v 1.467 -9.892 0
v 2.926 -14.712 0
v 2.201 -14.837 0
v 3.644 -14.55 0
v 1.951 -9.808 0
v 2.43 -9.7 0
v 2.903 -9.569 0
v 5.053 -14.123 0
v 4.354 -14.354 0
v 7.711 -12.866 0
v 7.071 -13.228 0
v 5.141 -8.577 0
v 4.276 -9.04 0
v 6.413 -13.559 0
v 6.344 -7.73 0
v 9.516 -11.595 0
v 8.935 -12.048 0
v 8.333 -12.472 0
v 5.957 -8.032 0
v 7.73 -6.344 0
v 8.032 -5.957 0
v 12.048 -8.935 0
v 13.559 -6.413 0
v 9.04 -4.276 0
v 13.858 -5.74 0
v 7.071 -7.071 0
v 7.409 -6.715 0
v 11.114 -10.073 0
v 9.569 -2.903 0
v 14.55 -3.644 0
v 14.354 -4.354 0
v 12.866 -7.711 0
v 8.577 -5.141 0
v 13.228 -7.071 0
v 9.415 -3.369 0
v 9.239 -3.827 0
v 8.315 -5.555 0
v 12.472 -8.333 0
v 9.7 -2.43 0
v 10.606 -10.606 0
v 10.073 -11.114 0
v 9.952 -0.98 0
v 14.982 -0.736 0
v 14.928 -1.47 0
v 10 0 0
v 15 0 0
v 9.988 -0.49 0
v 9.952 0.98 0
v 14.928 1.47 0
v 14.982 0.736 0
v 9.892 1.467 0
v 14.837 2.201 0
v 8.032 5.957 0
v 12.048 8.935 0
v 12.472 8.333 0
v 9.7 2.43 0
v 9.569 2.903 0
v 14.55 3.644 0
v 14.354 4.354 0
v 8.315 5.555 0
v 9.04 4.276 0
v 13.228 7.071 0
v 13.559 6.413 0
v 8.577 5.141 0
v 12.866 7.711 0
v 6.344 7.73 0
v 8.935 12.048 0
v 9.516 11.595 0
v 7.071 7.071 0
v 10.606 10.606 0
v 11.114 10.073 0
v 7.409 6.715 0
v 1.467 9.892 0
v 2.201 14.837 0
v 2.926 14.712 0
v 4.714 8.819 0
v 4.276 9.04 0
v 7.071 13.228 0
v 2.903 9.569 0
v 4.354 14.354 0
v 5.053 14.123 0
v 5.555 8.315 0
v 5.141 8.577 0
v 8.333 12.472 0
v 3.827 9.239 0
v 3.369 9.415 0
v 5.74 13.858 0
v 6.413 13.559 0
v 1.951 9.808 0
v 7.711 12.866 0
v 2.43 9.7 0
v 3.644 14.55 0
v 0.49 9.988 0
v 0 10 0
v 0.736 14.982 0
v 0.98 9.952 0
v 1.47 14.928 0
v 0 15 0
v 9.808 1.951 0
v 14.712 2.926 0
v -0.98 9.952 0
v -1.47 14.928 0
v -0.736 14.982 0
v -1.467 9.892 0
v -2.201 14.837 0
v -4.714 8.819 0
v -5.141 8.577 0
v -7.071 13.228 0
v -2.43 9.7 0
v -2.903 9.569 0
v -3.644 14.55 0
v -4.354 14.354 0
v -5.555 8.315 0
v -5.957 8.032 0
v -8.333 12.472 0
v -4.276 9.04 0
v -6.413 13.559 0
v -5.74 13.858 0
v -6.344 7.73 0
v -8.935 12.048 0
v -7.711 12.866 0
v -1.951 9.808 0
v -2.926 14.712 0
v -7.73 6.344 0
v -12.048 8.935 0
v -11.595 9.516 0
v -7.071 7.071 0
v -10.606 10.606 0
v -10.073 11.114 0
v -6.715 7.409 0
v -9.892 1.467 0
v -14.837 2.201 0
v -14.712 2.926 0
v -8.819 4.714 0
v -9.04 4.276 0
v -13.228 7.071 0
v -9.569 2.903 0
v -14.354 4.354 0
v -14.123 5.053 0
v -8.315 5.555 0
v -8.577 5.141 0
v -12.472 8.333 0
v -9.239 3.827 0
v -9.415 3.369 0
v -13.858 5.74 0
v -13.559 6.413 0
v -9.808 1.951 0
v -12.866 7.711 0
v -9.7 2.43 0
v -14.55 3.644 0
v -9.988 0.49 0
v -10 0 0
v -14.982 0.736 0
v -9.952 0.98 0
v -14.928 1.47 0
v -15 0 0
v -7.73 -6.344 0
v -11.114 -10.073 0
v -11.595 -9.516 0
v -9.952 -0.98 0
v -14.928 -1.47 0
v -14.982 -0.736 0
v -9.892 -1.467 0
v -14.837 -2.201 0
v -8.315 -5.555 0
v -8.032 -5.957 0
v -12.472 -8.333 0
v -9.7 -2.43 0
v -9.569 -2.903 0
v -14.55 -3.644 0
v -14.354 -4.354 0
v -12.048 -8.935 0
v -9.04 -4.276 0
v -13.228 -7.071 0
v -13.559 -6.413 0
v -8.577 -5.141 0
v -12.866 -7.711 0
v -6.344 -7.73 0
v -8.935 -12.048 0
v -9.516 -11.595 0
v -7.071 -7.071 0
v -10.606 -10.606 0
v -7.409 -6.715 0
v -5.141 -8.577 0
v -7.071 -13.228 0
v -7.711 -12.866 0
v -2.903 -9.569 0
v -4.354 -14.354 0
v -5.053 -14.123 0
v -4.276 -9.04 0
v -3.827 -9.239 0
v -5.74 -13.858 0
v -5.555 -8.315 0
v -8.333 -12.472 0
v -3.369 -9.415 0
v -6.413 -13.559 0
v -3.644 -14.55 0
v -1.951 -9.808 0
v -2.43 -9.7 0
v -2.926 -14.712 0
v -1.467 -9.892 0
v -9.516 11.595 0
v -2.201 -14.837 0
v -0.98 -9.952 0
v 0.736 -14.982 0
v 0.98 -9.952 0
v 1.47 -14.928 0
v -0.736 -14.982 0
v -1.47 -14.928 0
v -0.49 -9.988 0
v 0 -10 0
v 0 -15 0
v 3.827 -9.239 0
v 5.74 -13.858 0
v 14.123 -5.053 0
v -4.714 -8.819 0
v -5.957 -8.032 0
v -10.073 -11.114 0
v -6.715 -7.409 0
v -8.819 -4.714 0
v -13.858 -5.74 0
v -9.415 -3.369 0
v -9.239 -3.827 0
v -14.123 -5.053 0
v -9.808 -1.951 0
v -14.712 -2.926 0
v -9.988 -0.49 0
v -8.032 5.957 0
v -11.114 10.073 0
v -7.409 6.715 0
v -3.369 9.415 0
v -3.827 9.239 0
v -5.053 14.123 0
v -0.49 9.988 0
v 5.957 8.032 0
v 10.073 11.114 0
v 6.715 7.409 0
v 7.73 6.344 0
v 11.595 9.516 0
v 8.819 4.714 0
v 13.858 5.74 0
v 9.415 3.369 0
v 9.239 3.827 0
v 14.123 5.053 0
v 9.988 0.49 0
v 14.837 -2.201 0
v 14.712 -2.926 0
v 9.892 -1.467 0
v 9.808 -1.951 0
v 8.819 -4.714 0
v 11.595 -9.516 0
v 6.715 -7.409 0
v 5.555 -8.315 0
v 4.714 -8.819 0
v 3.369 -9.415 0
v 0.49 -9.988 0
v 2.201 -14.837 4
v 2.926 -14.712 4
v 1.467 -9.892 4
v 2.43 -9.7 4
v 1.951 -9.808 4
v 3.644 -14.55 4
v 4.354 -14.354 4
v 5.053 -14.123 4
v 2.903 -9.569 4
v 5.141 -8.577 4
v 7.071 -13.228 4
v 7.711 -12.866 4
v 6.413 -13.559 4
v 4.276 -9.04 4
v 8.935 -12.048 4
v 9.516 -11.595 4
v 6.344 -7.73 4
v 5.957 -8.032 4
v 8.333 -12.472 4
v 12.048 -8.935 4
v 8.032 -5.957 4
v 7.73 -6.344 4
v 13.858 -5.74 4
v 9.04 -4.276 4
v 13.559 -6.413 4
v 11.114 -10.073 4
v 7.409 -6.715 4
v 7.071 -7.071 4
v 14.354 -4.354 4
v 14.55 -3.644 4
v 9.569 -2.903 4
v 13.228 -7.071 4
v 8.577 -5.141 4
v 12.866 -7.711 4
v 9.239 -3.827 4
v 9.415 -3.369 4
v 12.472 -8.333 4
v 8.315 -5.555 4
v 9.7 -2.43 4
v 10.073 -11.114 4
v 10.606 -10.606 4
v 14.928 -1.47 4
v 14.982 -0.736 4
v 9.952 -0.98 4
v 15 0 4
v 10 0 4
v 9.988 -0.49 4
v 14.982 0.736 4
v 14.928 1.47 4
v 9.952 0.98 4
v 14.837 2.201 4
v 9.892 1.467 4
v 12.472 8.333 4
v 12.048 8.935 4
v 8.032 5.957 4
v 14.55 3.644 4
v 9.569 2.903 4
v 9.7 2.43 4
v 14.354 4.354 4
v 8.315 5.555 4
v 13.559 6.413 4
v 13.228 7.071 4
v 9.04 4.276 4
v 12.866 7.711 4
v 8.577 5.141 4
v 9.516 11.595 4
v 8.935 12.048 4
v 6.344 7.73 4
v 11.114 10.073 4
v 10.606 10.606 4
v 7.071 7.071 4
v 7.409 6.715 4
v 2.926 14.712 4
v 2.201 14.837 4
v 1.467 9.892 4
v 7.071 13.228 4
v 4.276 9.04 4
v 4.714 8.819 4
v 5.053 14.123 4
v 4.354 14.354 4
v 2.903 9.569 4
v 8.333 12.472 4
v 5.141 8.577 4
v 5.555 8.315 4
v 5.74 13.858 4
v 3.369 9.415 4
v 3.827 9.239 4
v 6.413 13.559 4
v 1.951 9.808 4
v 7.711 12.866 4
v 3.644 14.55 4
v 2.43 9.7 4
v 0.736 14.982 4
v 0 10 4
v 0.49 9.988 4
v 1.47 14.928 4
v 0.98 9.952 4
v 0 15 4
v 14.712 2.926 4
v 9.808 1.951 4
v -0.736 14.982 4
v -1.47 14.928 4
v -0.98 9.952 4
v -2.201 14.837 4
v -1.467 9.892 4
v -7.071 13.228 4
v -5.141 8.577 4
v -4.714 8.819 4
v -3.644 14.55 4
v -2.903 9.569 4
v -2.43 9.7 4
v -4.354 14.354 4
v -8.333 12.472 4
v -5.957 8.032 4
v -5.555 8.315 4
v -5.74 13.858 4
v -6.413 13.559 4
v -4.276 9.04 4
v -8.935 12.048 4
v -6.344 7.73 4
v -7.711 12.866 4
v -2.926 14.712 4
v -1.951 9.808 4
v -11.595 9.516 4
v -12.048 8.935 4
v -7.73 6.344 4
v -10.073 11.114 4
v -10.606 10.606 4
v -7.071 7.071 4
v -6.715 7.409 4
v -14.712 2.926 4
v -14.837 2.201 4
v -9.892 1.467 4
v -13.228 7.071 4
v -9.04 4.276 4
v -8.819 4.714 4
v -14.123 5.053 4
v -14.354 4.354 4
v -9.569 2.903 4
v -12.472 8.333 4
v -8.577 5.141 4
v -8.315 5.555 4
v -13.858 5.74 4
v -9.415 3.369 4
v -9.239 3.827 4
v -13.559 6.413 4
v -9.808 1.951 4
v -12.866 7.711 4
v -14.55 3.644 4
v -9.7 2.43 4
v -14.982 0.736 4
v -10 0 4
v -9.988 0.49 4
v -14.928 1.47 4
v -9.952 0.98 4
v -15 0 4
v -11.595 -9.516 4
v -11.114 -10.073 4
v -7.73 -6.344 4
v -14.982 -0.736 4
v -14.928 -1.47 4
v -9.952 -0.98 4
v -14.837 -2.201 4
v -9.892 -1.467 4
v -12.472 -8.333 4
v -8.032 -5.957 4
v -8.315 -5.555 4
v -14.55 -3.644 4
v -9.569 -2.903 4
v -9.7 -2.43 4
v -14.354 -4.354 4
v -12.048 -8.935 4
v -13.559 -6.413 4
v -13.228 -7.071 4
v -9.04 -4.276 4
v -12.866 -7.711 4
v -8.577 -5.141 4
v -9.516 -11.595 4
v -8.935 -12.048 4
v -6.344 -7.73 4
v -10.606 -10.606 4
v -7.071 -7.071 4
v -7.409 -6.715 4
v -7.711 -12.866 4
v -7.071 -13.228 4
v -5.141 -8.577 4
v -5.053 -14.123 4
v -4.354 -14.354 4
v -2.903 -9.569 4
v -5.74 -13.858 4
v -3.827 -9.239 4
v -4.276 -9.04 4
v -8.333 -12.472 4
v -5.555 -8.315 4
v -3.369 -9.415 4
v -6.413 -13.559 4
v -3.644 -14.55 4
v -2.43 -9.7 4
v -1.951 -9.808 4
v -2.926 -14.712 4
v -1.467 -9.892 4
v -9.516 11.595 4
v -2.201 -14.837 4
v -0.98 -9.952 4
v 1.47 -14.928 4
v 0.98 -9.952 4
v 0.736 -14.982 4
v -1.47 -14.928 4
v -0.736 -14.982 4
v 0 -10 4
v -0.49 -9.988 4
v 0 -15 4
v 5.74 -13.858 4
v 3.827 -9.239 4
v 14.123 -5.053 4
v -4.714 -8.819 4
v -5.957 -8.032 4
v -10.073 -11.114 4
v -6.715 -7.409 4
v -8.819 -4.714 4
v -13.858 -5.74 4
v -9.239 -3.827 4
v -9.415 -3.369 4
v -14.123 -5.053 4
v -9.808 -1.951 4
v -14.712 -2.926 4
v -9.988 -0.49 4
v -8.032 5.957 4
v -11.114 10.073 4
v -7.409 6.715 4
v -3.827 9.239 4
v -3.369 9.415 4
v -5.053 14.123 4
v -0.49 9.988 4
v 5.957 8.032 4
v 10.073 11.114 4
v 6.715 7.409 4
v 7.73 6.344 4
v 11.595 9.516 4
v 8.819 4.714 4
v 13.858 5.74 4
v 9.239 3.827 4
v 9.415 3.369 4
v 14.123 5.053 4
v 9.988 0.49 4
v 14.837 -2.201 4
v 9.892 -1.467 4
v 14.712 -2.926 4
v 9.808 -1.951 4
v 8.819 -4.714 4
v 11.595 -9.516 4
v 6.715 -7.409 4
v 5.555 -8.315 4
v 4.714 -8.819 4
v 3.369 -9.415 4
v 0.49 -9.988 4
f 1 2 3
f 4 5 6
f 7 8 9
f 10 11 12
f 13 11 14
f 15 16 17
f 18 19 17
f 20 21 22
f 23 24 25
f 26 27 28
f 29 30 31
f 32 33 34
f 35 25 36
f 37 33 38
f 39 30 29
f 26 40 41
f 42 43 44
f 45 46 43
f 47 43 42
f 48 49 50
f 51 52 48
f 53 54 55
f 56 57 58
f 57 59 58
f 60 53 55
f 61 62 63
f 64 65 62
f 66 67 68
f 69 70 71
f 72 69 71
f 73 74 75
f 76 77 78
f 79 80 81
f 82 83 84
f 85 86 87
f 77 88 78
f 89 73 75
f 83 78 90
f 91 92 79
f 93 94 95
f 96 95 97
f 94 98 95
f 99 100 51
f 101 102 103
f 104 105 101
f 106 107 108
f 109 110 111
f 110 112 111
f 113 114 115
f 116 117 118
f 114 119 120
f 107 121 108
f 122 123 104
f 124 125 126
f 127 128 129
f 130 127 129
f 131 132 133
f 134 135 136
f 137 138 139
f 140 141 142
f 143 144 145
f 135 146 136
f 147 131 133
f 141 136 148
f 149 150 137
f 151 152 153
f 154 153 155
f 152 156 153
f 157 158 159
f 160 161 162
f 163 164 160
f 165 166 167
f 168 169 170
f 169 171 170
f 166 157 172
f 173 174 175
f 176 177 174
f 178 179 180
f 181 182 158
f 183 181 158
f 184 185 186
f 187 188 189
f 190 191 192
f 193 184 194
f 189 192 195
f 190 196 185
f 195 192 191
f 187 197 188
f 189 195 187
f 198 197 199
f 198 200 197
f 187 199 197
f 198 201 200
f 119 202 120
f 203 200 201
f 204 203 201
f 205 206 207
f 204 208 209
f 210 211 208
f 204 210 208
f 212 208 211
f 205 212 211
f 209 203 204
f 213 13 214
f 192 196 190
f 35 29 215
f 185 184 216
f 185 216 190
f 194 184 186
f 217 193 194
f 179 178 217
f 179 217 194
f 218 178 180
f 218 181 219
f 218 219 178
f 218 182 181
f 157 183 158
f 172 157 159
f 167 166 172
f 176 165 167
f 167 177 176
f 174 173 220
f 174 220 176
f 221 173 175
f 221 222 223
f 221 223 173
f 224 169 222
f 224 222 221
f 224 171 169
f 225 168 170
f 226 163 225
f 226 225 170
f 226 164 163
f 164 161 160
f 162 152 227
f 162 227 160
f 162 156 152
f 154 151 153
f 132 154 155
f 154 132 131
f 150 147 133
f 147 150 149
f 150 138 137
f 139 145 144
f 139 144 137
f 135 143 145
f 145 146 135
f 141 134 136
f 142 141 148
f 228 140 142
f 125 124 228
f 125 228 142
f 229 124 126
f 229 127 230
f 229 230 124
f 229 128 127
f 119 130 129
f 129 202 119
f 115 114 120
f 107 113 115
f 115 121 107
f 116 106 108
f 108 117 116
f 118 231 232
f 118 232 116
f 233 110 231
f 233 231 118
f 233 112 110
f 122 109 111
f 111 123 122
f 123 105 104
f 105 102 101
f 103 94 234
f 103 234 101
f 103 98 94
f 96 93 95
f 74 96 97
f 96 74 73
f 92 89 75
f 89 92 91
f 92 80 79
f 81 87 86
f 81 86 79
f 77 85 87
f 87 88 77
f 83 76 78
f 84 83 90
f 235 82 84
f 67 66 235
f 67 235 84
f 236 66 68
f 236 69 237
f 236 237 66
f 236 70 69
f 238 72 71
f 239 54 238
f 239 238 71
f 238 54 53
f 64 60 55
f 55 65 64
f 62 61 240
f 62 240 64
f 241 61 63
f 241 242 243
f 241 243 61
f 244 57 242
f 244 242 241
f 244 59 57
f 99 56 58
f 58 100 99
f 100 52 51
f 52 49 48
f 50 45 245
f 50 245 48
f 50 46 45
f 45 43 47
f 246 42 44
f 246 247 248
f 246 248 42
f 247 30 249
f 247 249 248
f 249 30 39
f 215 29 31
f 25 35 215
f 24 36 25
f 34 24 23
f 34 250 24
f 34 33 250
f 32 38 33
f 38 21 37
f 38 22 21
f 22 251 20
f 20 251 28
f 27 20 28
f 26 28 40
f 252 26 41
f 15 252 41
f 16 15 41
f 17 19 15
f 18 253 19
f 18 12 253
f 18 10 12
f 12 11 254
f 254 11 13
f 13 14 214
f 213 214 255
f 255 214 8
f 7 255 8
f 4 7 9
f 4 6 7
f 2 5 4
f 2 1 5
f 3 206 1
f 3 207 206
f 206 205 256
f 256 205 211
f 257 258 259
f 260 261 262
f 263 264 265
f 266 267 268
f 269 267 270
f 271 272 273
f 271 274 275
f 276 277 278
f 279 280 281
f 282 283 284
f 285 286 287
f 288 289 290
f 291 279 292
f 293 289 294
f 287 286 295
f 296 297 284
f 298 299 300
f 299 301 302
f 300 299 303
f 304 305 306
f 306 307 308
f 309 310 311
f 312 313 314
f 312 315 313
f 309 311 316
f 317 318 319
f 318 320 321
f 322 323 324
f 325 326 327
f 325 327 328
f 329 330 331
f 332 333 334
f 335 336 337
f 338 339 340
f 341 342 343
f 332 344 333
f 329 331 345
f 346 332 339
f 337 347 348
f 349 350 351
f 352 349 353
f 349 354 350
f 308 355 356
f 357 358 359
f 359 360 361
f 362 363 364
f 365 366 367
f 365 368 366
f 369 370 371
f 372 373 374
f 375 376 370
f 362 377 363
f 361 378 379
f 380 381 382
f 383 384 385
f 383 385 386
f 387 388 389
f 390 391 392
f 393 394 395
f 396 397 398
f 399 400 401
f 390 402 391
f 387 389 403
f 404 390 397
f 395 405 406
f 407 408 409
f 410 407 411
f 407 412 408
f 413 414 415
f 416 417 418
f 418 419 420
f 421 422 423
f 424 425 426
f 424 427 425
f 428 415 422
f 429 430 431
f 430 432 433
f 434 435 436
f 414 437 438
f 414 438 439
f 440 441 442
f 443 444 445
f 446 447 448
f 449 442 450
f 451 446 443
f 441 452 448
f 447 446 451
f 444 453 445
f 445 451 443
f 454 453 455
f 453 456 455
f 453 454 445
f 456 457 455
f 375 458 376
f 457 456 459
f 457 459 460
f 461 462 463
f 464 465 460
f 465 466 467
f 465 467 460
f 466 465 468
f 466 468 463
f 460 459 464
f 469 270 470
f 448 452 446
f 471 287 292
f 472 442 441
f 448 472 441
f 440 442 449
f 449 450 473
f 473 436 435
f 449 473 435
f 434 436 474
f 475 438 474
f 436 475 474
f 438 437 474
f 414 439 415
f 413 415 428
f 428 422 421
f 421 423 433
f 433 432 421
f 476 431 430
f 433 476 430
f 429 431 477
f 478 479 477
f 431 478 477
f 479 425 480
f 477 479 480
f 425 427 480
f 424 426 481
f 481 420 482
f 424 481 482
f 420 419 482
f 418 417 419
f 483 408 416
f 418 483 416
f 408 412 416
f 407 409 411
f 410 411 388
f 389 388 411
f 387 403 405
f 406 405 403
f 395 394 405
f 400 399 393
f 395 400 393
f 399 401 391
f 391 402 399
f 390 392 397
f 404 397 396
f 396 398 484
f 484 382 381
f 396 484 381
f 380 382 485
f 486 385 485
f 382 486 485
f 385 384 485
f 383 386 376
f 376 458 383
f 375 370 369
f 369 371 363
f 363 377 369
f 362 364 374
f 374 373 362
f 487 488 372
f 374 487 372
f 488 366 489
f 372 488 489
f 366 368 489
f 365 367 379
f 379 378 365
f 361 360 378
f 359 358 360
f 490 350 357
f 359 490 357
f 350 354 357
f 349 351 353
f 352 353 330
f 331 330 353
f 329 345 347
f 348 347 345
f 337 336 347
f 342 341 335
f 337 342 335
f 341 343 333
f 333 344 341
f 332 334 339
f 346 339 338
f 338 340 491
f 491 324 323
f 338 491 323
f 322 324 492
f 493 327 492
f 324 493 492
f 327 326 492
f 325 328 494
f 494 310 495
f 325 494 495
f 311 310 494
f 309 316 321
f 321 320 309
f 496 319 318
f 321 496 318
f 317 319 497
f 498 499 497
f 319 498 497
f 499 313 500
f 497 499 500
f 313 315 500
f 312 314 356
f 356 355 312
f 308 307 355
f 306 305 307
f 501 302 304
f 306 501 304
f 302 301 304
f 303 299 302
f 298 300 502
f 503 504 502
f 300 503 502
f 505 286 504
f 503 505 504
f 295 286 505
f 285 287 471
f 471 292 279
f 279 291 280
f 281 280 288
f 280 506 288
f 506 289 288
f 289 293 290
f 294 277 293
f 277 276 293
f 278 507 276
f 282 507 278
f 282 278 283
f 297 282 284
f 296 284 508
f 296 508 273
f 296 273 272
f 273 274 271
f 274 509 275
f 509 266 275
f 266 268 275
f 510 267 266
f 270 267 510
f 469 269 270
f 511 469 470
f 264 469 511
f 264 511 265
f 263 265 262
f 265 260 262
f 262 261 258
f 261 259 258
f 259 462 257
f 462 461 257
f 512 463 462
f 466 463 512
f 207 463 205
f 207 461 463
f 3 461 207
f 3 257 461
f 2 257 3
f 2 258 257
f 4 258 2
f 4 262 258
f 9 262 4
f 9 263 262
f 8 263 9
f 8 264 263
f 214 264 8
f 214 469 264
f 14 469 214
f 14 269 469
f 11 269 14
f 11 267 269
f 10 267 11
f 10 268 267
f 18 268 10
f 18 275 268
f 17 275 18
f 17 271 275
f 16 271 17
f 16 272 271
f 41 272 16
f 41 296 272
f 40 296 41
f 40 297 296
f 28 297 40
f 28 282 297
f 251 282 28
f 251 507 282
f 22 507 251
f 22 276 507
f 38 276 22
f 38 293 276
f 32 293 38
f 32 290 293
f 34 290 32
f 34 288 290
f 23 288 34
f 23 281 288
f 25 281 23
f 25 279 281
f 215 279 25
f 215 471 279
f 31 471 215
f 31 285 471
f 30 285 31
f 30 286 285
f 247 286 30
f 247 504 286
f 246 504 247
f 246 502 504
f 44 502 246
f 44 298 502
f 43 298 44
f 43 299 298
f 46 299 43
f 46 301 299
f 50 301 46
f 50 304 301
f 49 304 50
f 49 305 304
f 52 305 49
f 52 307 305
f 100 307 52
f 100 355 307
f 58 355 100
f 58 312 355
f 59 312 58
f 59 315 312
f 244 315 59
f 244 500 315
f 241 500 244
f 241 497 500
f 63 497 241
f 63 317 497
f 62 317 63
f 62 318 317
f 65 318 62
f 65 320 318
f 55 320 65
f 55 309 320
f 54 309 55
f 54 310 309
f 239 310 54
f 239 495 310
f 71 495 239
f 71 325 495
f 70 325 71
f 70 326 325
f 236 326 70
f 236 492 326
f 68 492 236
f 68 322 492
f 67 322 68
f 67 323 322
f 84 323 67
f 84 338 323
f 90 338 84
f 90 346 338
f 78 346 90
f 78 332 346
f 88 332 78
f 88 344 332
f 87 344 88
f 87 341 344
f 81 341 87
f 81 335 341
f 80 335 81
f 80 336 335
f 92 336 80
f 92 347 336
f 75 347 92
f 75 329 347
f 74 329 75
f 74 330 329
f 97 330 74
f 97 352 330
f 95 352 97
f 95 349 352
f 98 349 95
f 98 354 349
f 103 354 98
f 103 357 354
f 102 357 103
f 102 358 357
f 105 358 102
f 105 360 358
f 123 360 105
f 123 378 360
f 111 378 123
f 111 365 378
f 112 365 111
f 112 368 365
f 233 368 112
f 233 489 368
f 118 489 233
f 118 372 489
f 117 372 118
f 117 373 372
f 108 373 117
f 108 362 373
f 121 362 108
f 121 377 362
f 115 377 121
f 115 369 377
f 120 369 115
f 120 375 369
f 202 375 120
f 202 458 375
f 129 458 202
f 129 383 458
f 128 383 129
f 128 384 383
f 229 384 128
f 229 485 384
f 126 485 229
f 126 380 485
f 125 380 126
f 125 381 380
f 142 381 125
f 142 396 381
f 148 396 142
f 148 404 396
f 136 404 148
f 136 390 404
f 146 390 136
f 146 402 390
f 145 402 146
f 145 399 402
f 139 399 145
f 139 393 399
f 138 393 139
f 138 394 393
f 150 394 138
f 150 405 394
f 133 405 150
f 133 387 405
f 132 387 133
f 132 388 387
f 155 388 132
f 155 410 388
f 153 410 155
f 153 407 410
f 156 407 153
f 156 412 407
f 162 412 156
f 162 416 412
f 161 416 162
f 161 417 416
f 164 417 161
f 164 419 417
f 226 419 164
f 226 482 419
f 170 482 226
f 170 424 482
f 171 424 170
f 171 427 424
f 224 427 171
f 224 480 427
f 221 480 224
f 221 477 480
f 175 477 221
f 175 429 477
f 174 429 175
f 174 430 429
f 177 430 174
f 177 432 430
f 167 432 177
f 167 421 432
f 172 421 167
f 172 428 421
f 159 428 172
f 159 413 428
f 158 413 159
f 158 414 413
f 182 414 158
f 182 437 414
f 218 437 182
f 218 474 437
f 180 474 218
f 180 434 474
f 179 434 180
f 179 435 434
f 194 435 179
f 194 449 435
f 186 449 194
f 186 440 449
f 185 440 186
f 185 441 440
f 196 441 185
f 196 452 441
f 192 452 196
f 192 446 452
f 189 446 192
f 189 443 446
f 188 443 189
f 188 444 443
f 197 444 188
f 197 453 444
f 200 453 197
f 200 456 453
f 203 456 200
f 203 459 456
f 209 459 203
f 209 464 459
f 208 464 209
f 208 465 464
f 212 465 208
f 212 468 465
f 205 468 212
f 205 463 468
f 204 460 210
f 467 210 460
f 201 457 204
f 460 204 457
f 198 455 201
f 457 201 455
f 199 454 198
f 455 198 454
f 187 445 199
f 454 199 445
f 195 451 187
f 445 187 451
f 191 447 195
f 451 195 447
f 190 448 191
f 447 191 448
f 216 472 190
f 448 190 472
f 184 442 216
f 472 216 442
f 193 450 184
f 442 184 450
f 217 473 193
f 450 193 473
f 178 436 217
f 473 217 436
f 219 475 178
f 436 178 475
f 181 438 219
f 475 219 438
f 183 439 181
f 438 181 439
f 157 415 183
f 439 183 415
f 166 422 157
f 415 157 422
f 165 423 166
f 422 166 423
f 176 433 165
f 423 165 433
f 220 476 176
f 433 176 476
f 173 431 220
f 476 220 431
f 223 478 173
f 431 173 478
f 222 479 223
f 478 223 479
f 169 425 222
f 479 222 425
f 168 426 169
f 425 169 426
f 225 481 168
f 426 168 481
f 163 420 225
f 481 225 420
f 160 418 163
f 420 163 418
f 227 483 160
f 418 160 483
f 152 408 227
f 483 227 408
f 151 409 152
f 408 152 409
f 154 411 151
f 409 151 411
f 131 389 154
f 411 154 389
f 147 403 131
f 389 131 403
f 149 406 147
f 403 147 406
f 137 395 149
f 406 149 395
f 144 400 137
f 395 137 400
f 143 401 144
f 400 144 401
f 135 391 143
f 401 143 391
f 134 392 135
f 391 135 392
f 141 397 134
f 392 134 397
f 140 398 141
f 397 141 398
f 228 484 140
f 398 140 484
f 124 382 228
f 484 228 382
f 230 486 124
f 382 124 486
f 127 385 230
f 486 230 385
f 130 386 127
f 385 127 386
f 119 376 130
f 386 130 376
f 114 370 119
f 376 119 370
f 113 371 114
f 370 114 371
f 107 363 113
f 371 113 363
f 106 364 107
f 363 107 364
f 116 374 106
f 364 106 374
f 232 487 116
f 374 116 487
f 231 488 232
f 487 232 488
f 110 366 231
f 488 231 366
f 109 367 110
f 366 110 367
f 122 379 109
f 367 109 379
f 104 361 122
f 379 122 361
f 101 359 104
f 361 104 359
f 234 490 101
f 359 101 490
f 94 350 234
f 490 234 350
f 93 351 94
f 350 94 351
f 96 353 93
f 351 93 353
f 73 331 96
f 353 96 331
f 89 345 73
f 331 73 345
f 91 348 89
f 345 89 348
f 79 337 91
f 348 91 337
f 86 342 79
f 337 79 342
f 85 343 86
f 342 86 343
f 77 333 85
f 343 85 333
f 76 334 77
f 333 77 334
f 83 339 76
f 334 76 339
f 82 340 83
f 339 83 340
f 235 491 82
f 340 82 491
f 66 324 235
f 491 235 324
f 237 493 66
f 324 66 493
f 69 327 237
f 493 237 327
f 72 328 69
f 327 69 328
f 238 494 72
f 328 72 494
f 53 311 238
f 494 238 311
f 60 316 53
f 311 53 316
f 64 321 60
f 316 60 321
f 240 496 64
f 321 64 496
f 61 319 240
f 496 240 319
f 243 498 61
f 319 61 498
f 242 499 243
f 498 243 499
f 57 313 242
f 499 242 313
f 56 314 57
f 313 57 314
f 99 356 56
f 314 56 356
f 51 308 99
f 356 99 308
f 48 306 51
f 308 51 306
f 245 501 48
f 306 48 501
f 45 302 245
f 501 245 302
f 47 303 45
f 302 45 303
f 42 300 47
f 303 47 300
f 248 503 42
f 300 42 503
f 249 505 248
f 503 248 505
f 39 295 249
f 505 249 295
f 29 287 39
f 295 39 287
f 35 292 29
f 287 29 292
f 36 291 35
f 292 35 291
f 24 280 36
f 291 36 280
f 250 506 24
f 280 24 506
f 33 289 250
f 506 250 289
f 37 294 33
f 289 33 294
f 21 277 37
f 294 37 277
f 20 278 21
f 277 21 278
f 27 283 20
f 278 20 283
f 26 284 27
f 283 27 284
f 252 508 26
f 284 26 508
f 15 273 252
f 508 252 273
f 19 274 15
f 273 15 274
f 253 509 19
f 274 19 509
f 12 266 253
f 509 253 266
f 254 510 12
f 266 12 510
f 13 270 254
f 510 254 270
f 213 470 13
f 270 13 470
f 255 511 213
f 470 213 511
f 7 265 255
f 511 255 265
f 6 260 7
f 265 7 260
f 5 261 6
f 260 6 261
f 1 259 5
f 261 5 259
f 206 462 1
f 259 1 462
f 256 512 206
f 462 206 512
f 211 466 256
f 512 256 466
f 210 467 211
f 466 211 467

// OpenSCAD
linear_extrude(height = 4.0, twist = 0.0, scale = 1.0, slices = 1, center = false)
{
    difference()
    {
        scale([30.0, 30.0])
        {
            M196();
        }
        scale([20.0, 20.0])
        {
            M196();
        }
    }
}

module M196()
{
    polygon
    (
        points =
        [
            [0.5, 0.0], 
            [0.4993977281025862, 0.024533837163709007], 
            [0.49759236333609846, 0.0490085701647803], 
            [0.4945882549823905, 0.07336523722768087], 
            [0.4903926402016152, 0.09754516100806412], 
            [0.485015626597272, 0.12149008995163194], 
            [0.4784701678661044, 0.14514233862723117], 
            [0.4707720325915104, 0.16844492669611003], 
            [0.46193976625564337, 0.1913417161825449], 
            [0.45199464656172167, 0.21377754671514104], 
            [0.4409606321741775, 0.23569836841299882], 
            [0.42886430500013606, 0.25705137209661083], 
            [0.4157348061512726, 0.2777851165098011], 
            [0.40160376574032247, 0.2978496522462167], 
            [0.3865052266813685, 0.31719664208182274], 
            [0.37047556267747955, 0.33577947742350917], 
            [0.3535533905932738, 0.35355339059327373], 
            [0.33577947742350917, 0.37047556267747955], 
            [0.31719664208182274, 0.3865052266813685], 
            [0.29784965224621673, 0.4016037657403224], 
            [0.27778511650980114, 0.4157348061512726], 
            [0.25705137209661083, 0.42886430500013606], 
            [0.2356983684129989, 0.44096063217417747], 
            [0.2137775467151411, 0.45199464656172167], 
            [0.19134171618254492, 0.46193976625564337], 
            [0.16844492669611003, 0.4707720325915104], 
            [0.14514233862723117, 0.47847016786610447], 
            [0.12149008995163199, 0.485015626597272], 
            [0.09754516100806417, 0.4903926402016152], 
            [0.07336523722768087, 0.4945882549823905], 
            [0.049008570164780385, 0.4975923633360984], 
            [0.024533837163709063, 0.4993977281025862], 
            [3.061616997868383E-17, 0.5], 
            [-0.024533837163709004, 0.4993977281025862], 
            [-0.04900857016478032, 0.49759236333609846], 
            [-0.07336523722768082, 0.4945882549823905], 
            [-0.0975451610080641, 0.4903926402016152], 
            [-0.12149008995163194, 0.485015626597272], 
            [-0.14514233862723108, 0.47847016786610447], 
            [-0.16844492669610997, 0.4707720325915104], 
            [-0.19134171618254486, 0.46193976625564337], 
            [-0.21377754671514093, 0.4519946465617217], 
            [-0.23569836841299885, 0.4409606321741775], 
            [-0.25705137209661083, 0.42886430500013606], 
            [-0.277785116509801, 0.41573480615127273], 
            [-0.2978496522462167, 0.40160376574032247], 
            [-0.3171966420818227, 0.38650522668136855], 
            [-0.3357794774235092, 0.3704755626774795], 
            [-0.35355339059327373, 0.3535533905932738], 
            [-0.37047556267747944, 0.3357794774235093], 
            [-0.3865052266813685, 0.31719664208182274], 
            [-0.4016037657403224, 0.29784965224621673], 
            [-0.4157348061512727, 0.2777851165098011], 
            [-0.428864305000136, 0.2570513720966109], 
            [-0.44096063217417747, 0.23569836841299893], 
            [-0.45199464656172167, 0.21377754671514101], 
            [-0.46193976625564337, 0.19134171618254495], 
            [-0.47077203259151035, 0.16844492669611016], 
            [-0.4784701678661044, 0.1451423386272312], 
            [-0.485015626597272, 0.12149008995163203], 
            [-0.4903926402016152, 0.0975451610080643], 
            [-0.4945882549823905, 0.0733652372276809], 
            [-0.4975923633360984, 0.04900857016478041], 
            [-0.4993977281025862, 0.024533837163708983], 
            [-0.5, 6.123233995736766E-17], 
            [-0.4993977281025862, -0.024533837163708862], 
            [-0.49759236333609846, -0.049008570164780295], 
            [-0.4945882549823905, -0.07336523722768079], 
            [-0.4903926402016152, -0.09754516100806418], 
            [-0.485015626597272, -0.12149008995163191], 
            [-0.47847016786610447, -0.14514233862723105], 
            [-0.4707720325915104, -0.16844492669611005], 
            [-0.4619397662556434, -0.19134171618254484], 
            [-0.4519946465617217, -0.2137775467151409], 
            [-0.4409606321741775, -0.23569836841299882], 
            [-0.42886430500013606, -0.2570513720966108], 
            [-0.41573480615127273, -0.277785116509801], 
            [-0.40160376574032247, -0.2978496522462166], 
            [-0.38650522668136855, -0.31719664208182263], 
            [-0.37047556267747955, -0.3357794774235092], 
            [-0.35355339059327384, -0.35355339059327373], 
            [-0.33577947742350933, -0.37047556267747944], 
            [-0.31719664208182297, -0.38650522668136833], 
            [-0.29784965224621657, -0.4016037657403225], 
            [-0.2777851165098011, -0.4157348061512726], 
            [-0.2570513720966109, -0.428864305000136], 
            [-0.23569836841299893, -0.44096063217417747], 
            [-0.21377754671514124, -0.45199464656172156], 
            [-0.19134171618254517, -0.46193976625564326], 
            [-0.16844492669610997, -0.4707720325915104], 
            [-0.14514233862723122, -0.4784701678661044], 
            [-0.12149008995163206, -0.485015626597272], 
            [-0.09754516100806433, -0.49039264020161516], 
            [-0.07336523722768115, -0.49458825498239045], 
            [-0.049008570164780225, -0.49759236333609846], 
            [-0.024533837163709014, -0.4993977281025862], 
            [-9.184850993605148E-17, -0.5], 
            [0.02453383716370883, -0.4993977281025862], 
            [0.049008570164780045, -0.49759236333609846], 
            [0.07336523722768097, -0.49458825498239045], 
            [0.09754516100806415, -0.4903926402016152], 
            [0.12149008995163188, -0.485015626597272], 
            [0.14514233862723103, -0.47847016786610447], 
            [0.1684449266961098, -0.47077203259151046], 
            [0.191341716182545, -0.4619397662556433], 
            [0.21377754671514107, -0.45199464656172167], 
            [0.2356983684129988, -0.4409606321741775], 
            [0.2570513720966108, -0.4288643050001361], 
            [0.2777851165098009, -0.41573480615127273], 
            [0.29784965224621646, -0.40160376574032264], 
            [0.3171966420818228, -0.38650522668136844], 
            [0.33577947742350917, -0.37047556267747955], 
            [0.3535533905932737, -0.35355339059327384], 
            [0.37047556267747944, -0.33577947742350933], 
            [0.38650522668136833, -0.31719664208182297], 
            [0.4016037657403225, -0.2978496522462166], 
            [0.4157348061512726, -0.2777851165098011], 
            [0.428864305000136, -0.25705137209661094], 
            [0.4409606321741774, -0.23569836841299896], 
            [0.45199464656172156, -0.21377754671514126], 
            [0.46193976625564326, -0.1913417161825452], 
            [0.4707720325915104, -0.16844492669611], 
            [0.4784701678661044, -0.14514233862723125], 
            [0.485015626597272, -0.12149008995163209], 
            [0.49039264020161516, -0.09754516100806436], 
            [0.49458825498239045, -0.0733652372276812], 
            [0.49759236333609846, -0.04900857016478025], 
            [0.4993977281025862, -0.024533837163709046]
        ],
        paths =
        [
            [0, 1, 2, 3, 4, 5, 6, 7, 8, 9, 10, 11, 12, 13, 14, 15, 16, 17, 18, 19, 20, 21, 22, 23, 24, 25, 26, 27, 28, 29, 30, 31, 32, 33, 34, 35, 36, 37, 38, 39, 40, 41, 42, 43, 44, 45, 46, 47, 48, 49, 50, 51, 52, 53, 54, 55, 56, 57, 58, 59, 60, 61, 62, 63, 64, 65, 66, 67, 68, 69, 70, 71, 72, 73, 74, 75, 76, 77, 78, 79, 80, 81, 82, 83, 84, 85, 86, 87, 88, 89, 90, 91, 92, 93, 94, 95, 96, 97, 98, 99, 100, 101, 102, 103, 104, 105, 106, 107, 108, 109, 110, 111, 112, 113, 114, 115, 116, 117, 118, 119, 120, 121, 122, 123, 124, 125, 126, 127]
        ]
    );
}
